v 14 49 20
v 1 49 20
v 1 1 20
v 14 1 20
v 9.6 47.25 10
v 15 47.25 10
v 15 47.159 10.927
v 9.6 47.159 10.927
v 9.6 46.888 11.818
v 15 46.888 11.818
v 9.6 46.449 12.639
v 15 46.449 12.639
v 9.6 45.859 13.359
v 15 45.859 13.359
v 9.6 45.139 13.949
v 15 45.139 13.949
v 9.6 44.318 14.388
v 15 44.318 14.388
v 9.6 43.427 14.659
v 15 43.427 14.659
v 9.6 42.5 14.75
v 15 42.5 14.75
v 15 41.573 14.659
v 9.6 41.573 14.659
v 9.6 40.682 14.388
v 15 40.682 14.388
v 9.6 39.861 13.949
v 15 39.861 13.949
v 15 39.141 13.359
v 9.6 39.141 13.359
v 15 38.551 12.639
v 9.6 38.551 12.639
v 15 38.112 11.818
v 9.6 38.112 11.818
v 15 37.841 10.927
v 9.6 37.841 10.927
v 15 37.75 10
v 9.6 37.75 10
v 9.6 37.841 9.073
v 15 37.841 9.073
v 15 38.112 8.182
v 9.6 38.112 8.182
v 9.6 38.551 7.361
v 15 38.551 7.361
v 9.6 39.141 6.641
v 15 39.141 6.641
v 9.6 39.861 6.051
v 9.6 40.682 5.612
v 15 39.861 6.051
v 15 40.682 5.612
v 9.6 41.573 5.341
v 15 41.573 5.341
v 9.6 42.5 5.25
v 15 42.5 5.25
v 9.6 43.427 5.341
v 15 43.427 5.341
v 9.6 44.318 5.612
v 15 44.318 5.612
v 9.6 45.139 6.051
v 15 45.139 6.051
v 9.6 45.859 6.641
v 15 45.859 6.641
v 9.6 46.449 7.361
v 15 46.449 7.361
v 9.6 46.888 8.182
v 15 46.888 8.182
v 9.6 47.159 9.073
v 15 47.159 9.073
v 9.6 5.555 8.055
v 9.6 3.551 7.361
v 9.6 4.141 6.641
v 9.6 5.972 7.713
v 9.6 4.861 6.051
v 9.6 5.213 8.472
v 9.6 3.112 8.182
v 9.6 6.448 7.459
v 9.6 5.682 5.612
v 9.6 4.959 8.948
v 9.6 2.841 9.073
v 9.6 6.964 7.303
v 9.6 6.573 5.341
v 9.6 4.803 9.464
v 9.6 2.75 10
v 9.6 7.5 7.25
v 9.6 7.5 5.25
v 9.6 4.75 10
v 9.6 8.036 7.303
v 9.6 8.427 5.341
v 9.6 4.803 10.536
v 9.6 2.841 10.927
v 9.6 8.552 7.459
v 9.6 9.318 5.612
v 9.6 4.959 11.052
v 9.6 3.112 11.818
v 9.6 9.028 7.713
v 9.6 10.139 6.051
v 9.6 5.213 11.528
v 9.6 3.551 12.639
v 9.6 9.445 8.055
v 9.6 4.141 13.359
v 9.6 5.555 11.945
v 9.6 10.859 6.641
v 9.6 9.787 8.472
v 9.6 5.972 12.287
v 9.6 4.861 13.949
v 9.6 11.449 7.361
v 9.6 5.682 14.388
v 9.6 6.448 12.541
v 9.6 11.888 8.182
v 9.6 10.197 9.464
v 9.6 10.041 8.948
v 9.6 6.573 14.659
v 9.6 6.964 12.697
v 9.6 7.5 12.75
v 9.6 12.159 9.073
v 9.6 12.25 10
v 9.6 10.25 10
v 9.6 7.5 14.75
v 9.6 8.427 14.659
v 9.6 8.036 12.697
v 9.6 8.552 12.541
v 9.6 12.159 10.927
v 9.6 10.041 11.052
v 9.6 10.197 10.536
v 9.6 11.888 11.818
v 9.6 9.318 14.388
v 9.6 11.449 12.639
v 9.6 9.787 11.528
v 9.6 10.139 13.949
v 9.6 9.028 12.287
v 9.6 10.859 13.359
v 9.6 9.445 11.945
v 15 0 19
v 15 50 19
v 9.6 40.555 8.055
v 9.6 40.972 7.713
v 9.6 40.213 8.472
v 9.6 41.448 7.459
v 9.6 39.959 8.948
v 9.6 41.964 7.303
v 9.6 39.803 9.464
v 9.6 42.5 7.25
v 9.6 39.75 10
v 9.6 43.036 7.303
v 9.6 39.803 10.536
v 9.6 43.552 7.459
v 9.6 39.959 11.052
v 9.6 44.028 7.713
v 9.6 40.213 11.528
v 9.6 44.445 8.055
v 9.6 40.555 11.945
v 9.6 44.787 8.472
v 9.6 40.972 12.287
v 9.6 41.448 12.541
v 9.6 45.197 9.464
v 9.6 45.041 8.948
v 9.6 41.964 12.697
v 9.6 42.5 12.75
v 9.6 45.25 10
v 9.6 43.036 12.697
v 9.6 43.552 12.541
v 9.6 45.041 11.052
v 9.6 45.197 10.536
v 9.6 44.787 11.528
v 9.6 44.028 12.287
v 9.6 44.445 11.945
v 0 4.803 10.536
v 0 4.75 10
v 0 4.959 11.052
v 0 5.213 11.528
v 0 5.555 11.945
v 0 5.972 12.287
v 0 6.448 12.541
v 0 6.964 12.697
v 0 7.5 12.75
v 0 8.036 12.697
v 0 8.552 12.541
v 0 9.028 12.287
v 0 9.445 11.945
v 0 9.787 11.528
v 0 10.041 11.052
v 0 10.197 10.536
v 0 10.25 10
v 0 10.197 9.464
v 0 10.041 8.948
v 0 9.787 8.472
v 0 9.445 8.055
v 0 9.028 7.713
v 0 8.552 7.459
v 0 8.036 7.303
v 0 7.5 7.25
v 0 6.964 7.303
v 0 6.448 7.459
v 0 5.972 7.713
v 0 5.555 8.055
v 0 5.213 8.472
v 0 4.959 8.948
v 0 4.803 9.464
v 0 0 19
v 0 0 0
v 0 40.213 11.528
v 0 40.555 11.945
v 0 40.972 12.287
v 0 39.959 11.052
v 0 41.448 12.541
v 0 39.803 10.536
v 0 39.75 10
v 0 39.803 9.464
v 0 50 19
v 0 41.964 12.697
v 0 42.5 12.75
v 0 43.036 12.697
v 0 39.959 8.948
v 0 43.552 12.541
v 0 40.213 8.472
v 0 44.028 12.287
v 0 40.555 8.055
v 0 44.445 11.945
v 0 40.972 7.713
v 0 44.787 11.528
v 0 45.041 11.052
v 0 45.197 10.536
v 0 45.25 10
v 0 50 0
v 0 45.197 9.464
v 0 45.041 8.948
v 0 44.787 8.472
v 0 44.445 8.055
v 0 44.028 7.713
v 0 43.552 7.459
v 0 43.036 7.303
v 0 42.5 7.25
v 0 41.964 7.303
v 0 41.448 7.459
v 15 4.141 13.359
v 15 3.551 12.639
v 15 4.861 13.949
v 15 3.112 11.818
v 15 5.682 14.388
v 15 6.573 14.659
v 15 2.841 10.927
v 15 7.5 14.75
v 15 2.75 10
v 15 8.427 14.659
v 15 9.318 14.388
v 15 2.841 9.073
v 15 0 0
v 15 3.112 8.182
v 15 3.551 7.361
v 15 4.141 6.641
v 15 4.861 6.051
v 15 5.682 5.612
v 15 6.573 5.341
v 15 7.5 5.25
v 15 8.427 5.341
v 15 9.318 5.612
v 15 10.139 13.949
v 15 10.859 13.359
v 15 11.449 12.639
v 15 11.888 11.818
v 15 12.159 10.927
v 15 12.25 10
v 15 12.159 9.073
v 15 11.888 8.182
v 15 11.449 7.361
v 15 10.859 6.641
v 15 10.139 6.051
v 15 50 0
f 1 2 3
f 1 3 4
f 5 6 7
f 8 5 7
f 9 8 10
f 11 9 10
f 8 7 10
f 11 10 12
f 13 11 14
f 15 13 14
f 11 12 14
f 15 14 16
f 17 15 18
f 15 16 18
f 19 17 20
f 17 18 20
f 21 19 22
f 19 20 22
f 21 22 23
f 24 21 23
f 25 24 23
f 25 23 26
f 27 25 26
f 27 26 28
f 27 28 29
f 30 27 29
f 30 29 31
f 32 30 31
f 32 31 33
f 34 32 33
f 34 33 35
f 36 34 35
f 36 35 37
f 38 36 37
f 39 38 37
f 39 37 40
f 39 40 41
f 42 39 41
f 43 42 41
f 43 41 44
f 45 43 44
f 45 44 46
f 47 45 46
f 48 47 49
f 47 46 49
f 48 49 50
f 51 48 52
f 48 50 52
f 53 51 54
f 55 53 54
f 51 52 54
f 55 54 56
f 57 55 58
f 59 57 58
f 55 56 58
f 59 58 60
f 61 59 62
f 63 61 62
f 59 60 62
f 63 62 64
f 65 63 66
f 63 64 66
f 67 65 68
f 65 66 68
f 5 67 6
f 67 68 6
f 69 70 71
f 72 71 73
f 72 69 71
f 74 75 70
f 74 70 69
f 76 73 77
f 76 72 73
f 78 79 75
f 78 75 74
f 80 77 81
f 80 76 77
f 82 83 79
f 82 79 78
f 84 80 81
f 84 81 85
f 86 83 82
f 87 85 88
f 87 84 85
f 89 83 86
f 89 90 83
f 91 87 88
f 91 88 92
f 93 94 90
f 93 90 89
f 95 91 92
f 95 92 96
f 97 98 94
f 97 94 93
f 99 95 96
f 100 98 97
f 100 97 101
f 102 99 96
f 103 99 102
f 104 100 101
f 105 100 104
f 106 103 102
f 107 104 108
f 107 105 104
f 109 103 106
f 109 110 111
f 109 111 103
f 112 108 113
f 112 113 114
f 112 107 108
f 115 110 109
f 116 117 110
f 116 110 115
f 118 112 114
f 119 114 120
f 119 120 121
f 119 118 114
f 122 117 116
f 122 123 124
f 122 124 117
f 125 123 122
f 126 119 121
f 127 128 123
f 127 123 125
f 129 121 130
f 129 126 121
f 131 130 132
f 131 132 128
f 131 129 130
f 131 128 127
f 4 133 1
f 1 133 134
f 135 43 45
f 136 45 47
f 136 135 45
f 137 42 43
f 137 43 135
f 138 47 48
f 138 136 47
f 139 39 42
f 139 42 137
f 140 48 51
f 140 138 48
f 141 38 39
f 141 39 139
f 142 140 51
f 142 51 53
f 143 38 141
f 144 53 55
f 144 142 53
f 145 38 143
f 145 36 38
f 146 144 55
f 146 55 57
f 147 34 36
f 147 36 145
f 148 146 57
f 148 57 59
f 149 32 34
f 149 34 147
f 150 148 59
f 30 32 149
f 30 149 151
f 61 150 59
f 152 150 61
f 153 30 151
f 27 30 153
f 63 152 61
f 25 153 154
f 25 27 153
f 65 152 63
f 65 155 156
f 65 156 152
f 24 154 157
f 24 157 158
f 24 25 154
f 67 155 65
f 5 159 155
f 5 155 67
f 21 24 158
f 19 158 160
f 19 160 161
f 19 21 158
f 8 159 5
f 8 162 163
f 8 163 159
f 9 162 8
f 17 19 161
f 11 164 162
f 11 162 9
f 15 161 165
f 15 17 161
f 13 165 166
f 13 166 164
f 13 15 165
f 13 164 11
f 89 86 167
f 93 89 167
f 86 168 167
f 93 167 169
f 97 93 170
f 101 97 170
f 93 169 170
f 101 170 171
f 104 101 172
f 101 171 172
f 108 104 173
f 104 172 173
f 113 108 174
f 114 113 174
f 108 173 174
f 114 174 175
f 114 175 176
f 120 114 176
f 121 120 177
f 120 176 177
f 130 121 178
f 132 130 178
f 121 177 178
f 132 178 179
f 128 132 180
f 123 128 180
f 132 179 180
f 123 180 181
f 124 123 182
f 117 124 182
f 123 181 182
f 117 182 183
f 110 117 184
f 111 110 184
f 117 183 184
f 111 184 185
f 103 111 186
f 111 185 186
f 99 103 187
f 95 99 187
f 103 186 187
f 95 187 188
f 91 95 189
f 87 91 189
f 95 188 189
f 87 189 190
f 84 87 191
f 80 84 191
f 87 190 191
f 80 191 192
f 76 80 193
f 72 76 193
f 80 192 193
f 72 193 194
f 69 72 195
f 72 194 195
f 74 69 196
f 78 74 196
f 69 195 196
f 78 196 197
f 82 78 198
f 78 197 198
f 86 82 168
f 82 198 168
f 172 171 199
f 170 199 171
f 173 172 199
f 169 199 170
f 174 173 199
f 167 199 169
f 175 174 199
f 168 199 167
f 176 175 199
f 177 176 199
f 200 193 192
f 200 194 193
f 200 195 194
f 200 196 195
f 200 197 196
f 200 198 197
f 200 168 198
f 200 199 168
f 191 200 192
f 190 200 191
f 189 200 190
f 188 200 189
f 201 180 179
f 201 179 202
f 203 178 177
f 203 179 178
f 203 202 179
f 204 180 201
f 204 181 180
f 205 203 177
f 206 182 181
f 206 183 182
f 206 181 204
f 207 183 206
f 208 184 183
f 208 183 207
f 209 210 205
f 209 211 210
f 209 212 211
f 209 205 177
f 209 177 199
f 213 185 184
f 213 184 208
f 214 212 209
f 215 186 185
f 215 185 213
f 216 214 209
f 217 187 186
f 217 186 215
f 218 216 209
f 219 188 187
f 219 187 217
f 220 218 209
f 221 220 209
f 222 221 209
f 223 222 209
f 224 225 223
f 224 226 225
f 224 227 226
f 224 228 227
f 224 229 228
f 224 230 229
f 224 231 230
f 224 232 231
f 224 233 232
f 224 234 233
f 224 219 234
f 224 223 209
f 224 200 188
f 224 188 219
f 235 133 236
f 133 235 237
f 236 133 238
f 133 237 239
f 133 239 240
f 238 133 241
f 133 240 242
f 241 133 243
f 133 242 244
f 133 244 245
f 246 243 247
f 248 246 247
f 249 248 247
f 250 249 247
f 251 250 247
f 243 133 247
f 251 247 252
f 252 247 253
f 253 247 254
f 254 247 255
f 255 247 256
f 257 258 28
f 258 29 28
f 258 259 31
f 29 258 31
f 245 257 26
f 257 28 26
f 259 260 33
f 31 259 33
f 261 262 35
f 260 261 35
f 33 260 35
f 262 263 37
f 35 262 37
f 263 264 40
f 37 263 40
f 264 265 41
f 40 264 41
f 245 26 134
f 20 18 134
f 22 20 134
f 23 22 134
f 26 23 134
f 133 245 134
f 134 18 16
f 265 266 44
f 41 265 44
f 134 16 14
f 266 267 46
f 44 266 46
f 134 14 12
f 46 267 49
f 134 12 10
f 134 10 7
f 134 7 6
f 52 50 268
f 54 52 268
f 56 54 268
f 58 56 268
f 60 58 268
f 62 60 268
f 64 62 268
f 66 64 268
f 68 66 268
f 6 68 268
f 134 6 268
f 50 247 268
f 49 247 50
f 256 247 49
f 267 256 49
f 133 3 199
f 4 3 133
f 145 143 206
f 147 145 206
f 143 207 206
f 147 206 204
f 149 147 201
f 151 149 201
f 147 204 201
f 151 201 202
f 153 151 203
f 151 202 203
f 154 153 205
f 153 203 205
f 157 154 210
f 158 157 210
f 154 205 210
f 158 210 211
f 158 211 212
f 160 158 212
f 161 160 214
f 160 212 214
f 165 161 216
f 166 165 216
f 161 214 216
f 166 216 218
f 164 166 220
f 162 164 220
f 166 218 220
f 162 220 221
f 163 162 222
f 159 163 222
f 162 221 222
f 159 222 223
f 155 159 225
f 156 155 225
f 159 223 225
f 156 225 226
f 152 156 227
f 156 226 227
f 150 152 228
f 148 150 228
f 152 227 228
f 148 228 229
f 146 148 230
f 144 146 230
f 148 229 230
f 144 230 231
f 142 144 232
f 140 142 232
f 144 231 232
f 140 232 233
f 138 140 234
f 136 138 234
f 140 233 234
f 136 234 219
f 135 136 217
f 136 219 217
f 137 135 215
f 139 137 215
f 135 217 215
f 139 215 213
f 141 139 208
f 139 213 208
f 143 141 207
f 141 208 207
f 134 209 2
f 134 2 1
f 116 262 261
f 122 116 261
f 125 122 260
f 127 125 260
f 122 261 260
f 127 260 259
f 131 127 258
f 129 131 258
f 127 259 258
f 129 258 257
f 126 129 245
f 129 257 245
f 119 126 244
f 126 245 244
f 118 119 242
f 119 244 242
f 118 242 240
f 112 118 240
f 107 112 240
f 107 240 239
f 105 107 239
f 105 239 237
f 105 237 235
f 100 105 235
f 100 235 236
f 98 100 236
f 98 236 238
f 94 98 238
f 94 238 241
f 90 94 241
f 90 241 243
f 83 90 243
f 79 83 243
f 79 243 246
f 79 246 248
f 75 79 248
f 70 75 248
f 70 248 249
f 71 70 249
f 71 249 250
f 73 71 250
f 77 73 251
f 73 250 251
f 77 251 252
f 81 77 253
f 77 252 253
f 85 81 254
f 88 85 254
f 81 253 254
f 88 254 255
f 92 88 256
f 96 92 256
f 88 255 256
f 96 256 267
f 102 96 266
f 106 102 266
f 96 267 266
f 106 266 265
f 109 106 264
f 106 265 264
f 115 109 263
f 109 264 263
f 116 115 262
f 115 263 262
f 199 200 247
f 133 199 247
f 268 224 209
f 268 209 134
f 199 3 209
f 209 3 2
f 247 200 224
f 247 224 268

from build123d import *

# Parameters (mm, degrees)
F0_W           = 15
F0_H           = 50
F1_DEPTH       = 20
F3_D           = 5.5
F3_CBORE_D     = 9.5
F3_CBORE_DEPTH = 5.4
F4_SIZE        = 1


with BuildPart() as f1:
    # F0 (on Top) → F1 (new body)
    with BuildSketch(Plane.XY):
        with Locations((7.5, 25)):
            Rectangle(F0_W, F0_H)
    extrude(amount=F1_DEPTH)

    # F3 (through all)
    with Locations(Plane.YZ.offset(15)):
        with Locations((7.5, 10), (42.5, 10)):
            CounterBoreHole(F3_D / 2, F3_CBORE_D / 2, F3_CBORE_DEPTH)

    # F4
    f4_edges = [f1.edges().sort_by_distance(p)[0] for p in [
        (15, 25, 20),
        (7.5, 0, 20),
        (0, 25, 20),
        (7.5, 50, 20),
    ]]
    chamfer(f4_edges, length=F4_SIZE)


solid = f1.part
